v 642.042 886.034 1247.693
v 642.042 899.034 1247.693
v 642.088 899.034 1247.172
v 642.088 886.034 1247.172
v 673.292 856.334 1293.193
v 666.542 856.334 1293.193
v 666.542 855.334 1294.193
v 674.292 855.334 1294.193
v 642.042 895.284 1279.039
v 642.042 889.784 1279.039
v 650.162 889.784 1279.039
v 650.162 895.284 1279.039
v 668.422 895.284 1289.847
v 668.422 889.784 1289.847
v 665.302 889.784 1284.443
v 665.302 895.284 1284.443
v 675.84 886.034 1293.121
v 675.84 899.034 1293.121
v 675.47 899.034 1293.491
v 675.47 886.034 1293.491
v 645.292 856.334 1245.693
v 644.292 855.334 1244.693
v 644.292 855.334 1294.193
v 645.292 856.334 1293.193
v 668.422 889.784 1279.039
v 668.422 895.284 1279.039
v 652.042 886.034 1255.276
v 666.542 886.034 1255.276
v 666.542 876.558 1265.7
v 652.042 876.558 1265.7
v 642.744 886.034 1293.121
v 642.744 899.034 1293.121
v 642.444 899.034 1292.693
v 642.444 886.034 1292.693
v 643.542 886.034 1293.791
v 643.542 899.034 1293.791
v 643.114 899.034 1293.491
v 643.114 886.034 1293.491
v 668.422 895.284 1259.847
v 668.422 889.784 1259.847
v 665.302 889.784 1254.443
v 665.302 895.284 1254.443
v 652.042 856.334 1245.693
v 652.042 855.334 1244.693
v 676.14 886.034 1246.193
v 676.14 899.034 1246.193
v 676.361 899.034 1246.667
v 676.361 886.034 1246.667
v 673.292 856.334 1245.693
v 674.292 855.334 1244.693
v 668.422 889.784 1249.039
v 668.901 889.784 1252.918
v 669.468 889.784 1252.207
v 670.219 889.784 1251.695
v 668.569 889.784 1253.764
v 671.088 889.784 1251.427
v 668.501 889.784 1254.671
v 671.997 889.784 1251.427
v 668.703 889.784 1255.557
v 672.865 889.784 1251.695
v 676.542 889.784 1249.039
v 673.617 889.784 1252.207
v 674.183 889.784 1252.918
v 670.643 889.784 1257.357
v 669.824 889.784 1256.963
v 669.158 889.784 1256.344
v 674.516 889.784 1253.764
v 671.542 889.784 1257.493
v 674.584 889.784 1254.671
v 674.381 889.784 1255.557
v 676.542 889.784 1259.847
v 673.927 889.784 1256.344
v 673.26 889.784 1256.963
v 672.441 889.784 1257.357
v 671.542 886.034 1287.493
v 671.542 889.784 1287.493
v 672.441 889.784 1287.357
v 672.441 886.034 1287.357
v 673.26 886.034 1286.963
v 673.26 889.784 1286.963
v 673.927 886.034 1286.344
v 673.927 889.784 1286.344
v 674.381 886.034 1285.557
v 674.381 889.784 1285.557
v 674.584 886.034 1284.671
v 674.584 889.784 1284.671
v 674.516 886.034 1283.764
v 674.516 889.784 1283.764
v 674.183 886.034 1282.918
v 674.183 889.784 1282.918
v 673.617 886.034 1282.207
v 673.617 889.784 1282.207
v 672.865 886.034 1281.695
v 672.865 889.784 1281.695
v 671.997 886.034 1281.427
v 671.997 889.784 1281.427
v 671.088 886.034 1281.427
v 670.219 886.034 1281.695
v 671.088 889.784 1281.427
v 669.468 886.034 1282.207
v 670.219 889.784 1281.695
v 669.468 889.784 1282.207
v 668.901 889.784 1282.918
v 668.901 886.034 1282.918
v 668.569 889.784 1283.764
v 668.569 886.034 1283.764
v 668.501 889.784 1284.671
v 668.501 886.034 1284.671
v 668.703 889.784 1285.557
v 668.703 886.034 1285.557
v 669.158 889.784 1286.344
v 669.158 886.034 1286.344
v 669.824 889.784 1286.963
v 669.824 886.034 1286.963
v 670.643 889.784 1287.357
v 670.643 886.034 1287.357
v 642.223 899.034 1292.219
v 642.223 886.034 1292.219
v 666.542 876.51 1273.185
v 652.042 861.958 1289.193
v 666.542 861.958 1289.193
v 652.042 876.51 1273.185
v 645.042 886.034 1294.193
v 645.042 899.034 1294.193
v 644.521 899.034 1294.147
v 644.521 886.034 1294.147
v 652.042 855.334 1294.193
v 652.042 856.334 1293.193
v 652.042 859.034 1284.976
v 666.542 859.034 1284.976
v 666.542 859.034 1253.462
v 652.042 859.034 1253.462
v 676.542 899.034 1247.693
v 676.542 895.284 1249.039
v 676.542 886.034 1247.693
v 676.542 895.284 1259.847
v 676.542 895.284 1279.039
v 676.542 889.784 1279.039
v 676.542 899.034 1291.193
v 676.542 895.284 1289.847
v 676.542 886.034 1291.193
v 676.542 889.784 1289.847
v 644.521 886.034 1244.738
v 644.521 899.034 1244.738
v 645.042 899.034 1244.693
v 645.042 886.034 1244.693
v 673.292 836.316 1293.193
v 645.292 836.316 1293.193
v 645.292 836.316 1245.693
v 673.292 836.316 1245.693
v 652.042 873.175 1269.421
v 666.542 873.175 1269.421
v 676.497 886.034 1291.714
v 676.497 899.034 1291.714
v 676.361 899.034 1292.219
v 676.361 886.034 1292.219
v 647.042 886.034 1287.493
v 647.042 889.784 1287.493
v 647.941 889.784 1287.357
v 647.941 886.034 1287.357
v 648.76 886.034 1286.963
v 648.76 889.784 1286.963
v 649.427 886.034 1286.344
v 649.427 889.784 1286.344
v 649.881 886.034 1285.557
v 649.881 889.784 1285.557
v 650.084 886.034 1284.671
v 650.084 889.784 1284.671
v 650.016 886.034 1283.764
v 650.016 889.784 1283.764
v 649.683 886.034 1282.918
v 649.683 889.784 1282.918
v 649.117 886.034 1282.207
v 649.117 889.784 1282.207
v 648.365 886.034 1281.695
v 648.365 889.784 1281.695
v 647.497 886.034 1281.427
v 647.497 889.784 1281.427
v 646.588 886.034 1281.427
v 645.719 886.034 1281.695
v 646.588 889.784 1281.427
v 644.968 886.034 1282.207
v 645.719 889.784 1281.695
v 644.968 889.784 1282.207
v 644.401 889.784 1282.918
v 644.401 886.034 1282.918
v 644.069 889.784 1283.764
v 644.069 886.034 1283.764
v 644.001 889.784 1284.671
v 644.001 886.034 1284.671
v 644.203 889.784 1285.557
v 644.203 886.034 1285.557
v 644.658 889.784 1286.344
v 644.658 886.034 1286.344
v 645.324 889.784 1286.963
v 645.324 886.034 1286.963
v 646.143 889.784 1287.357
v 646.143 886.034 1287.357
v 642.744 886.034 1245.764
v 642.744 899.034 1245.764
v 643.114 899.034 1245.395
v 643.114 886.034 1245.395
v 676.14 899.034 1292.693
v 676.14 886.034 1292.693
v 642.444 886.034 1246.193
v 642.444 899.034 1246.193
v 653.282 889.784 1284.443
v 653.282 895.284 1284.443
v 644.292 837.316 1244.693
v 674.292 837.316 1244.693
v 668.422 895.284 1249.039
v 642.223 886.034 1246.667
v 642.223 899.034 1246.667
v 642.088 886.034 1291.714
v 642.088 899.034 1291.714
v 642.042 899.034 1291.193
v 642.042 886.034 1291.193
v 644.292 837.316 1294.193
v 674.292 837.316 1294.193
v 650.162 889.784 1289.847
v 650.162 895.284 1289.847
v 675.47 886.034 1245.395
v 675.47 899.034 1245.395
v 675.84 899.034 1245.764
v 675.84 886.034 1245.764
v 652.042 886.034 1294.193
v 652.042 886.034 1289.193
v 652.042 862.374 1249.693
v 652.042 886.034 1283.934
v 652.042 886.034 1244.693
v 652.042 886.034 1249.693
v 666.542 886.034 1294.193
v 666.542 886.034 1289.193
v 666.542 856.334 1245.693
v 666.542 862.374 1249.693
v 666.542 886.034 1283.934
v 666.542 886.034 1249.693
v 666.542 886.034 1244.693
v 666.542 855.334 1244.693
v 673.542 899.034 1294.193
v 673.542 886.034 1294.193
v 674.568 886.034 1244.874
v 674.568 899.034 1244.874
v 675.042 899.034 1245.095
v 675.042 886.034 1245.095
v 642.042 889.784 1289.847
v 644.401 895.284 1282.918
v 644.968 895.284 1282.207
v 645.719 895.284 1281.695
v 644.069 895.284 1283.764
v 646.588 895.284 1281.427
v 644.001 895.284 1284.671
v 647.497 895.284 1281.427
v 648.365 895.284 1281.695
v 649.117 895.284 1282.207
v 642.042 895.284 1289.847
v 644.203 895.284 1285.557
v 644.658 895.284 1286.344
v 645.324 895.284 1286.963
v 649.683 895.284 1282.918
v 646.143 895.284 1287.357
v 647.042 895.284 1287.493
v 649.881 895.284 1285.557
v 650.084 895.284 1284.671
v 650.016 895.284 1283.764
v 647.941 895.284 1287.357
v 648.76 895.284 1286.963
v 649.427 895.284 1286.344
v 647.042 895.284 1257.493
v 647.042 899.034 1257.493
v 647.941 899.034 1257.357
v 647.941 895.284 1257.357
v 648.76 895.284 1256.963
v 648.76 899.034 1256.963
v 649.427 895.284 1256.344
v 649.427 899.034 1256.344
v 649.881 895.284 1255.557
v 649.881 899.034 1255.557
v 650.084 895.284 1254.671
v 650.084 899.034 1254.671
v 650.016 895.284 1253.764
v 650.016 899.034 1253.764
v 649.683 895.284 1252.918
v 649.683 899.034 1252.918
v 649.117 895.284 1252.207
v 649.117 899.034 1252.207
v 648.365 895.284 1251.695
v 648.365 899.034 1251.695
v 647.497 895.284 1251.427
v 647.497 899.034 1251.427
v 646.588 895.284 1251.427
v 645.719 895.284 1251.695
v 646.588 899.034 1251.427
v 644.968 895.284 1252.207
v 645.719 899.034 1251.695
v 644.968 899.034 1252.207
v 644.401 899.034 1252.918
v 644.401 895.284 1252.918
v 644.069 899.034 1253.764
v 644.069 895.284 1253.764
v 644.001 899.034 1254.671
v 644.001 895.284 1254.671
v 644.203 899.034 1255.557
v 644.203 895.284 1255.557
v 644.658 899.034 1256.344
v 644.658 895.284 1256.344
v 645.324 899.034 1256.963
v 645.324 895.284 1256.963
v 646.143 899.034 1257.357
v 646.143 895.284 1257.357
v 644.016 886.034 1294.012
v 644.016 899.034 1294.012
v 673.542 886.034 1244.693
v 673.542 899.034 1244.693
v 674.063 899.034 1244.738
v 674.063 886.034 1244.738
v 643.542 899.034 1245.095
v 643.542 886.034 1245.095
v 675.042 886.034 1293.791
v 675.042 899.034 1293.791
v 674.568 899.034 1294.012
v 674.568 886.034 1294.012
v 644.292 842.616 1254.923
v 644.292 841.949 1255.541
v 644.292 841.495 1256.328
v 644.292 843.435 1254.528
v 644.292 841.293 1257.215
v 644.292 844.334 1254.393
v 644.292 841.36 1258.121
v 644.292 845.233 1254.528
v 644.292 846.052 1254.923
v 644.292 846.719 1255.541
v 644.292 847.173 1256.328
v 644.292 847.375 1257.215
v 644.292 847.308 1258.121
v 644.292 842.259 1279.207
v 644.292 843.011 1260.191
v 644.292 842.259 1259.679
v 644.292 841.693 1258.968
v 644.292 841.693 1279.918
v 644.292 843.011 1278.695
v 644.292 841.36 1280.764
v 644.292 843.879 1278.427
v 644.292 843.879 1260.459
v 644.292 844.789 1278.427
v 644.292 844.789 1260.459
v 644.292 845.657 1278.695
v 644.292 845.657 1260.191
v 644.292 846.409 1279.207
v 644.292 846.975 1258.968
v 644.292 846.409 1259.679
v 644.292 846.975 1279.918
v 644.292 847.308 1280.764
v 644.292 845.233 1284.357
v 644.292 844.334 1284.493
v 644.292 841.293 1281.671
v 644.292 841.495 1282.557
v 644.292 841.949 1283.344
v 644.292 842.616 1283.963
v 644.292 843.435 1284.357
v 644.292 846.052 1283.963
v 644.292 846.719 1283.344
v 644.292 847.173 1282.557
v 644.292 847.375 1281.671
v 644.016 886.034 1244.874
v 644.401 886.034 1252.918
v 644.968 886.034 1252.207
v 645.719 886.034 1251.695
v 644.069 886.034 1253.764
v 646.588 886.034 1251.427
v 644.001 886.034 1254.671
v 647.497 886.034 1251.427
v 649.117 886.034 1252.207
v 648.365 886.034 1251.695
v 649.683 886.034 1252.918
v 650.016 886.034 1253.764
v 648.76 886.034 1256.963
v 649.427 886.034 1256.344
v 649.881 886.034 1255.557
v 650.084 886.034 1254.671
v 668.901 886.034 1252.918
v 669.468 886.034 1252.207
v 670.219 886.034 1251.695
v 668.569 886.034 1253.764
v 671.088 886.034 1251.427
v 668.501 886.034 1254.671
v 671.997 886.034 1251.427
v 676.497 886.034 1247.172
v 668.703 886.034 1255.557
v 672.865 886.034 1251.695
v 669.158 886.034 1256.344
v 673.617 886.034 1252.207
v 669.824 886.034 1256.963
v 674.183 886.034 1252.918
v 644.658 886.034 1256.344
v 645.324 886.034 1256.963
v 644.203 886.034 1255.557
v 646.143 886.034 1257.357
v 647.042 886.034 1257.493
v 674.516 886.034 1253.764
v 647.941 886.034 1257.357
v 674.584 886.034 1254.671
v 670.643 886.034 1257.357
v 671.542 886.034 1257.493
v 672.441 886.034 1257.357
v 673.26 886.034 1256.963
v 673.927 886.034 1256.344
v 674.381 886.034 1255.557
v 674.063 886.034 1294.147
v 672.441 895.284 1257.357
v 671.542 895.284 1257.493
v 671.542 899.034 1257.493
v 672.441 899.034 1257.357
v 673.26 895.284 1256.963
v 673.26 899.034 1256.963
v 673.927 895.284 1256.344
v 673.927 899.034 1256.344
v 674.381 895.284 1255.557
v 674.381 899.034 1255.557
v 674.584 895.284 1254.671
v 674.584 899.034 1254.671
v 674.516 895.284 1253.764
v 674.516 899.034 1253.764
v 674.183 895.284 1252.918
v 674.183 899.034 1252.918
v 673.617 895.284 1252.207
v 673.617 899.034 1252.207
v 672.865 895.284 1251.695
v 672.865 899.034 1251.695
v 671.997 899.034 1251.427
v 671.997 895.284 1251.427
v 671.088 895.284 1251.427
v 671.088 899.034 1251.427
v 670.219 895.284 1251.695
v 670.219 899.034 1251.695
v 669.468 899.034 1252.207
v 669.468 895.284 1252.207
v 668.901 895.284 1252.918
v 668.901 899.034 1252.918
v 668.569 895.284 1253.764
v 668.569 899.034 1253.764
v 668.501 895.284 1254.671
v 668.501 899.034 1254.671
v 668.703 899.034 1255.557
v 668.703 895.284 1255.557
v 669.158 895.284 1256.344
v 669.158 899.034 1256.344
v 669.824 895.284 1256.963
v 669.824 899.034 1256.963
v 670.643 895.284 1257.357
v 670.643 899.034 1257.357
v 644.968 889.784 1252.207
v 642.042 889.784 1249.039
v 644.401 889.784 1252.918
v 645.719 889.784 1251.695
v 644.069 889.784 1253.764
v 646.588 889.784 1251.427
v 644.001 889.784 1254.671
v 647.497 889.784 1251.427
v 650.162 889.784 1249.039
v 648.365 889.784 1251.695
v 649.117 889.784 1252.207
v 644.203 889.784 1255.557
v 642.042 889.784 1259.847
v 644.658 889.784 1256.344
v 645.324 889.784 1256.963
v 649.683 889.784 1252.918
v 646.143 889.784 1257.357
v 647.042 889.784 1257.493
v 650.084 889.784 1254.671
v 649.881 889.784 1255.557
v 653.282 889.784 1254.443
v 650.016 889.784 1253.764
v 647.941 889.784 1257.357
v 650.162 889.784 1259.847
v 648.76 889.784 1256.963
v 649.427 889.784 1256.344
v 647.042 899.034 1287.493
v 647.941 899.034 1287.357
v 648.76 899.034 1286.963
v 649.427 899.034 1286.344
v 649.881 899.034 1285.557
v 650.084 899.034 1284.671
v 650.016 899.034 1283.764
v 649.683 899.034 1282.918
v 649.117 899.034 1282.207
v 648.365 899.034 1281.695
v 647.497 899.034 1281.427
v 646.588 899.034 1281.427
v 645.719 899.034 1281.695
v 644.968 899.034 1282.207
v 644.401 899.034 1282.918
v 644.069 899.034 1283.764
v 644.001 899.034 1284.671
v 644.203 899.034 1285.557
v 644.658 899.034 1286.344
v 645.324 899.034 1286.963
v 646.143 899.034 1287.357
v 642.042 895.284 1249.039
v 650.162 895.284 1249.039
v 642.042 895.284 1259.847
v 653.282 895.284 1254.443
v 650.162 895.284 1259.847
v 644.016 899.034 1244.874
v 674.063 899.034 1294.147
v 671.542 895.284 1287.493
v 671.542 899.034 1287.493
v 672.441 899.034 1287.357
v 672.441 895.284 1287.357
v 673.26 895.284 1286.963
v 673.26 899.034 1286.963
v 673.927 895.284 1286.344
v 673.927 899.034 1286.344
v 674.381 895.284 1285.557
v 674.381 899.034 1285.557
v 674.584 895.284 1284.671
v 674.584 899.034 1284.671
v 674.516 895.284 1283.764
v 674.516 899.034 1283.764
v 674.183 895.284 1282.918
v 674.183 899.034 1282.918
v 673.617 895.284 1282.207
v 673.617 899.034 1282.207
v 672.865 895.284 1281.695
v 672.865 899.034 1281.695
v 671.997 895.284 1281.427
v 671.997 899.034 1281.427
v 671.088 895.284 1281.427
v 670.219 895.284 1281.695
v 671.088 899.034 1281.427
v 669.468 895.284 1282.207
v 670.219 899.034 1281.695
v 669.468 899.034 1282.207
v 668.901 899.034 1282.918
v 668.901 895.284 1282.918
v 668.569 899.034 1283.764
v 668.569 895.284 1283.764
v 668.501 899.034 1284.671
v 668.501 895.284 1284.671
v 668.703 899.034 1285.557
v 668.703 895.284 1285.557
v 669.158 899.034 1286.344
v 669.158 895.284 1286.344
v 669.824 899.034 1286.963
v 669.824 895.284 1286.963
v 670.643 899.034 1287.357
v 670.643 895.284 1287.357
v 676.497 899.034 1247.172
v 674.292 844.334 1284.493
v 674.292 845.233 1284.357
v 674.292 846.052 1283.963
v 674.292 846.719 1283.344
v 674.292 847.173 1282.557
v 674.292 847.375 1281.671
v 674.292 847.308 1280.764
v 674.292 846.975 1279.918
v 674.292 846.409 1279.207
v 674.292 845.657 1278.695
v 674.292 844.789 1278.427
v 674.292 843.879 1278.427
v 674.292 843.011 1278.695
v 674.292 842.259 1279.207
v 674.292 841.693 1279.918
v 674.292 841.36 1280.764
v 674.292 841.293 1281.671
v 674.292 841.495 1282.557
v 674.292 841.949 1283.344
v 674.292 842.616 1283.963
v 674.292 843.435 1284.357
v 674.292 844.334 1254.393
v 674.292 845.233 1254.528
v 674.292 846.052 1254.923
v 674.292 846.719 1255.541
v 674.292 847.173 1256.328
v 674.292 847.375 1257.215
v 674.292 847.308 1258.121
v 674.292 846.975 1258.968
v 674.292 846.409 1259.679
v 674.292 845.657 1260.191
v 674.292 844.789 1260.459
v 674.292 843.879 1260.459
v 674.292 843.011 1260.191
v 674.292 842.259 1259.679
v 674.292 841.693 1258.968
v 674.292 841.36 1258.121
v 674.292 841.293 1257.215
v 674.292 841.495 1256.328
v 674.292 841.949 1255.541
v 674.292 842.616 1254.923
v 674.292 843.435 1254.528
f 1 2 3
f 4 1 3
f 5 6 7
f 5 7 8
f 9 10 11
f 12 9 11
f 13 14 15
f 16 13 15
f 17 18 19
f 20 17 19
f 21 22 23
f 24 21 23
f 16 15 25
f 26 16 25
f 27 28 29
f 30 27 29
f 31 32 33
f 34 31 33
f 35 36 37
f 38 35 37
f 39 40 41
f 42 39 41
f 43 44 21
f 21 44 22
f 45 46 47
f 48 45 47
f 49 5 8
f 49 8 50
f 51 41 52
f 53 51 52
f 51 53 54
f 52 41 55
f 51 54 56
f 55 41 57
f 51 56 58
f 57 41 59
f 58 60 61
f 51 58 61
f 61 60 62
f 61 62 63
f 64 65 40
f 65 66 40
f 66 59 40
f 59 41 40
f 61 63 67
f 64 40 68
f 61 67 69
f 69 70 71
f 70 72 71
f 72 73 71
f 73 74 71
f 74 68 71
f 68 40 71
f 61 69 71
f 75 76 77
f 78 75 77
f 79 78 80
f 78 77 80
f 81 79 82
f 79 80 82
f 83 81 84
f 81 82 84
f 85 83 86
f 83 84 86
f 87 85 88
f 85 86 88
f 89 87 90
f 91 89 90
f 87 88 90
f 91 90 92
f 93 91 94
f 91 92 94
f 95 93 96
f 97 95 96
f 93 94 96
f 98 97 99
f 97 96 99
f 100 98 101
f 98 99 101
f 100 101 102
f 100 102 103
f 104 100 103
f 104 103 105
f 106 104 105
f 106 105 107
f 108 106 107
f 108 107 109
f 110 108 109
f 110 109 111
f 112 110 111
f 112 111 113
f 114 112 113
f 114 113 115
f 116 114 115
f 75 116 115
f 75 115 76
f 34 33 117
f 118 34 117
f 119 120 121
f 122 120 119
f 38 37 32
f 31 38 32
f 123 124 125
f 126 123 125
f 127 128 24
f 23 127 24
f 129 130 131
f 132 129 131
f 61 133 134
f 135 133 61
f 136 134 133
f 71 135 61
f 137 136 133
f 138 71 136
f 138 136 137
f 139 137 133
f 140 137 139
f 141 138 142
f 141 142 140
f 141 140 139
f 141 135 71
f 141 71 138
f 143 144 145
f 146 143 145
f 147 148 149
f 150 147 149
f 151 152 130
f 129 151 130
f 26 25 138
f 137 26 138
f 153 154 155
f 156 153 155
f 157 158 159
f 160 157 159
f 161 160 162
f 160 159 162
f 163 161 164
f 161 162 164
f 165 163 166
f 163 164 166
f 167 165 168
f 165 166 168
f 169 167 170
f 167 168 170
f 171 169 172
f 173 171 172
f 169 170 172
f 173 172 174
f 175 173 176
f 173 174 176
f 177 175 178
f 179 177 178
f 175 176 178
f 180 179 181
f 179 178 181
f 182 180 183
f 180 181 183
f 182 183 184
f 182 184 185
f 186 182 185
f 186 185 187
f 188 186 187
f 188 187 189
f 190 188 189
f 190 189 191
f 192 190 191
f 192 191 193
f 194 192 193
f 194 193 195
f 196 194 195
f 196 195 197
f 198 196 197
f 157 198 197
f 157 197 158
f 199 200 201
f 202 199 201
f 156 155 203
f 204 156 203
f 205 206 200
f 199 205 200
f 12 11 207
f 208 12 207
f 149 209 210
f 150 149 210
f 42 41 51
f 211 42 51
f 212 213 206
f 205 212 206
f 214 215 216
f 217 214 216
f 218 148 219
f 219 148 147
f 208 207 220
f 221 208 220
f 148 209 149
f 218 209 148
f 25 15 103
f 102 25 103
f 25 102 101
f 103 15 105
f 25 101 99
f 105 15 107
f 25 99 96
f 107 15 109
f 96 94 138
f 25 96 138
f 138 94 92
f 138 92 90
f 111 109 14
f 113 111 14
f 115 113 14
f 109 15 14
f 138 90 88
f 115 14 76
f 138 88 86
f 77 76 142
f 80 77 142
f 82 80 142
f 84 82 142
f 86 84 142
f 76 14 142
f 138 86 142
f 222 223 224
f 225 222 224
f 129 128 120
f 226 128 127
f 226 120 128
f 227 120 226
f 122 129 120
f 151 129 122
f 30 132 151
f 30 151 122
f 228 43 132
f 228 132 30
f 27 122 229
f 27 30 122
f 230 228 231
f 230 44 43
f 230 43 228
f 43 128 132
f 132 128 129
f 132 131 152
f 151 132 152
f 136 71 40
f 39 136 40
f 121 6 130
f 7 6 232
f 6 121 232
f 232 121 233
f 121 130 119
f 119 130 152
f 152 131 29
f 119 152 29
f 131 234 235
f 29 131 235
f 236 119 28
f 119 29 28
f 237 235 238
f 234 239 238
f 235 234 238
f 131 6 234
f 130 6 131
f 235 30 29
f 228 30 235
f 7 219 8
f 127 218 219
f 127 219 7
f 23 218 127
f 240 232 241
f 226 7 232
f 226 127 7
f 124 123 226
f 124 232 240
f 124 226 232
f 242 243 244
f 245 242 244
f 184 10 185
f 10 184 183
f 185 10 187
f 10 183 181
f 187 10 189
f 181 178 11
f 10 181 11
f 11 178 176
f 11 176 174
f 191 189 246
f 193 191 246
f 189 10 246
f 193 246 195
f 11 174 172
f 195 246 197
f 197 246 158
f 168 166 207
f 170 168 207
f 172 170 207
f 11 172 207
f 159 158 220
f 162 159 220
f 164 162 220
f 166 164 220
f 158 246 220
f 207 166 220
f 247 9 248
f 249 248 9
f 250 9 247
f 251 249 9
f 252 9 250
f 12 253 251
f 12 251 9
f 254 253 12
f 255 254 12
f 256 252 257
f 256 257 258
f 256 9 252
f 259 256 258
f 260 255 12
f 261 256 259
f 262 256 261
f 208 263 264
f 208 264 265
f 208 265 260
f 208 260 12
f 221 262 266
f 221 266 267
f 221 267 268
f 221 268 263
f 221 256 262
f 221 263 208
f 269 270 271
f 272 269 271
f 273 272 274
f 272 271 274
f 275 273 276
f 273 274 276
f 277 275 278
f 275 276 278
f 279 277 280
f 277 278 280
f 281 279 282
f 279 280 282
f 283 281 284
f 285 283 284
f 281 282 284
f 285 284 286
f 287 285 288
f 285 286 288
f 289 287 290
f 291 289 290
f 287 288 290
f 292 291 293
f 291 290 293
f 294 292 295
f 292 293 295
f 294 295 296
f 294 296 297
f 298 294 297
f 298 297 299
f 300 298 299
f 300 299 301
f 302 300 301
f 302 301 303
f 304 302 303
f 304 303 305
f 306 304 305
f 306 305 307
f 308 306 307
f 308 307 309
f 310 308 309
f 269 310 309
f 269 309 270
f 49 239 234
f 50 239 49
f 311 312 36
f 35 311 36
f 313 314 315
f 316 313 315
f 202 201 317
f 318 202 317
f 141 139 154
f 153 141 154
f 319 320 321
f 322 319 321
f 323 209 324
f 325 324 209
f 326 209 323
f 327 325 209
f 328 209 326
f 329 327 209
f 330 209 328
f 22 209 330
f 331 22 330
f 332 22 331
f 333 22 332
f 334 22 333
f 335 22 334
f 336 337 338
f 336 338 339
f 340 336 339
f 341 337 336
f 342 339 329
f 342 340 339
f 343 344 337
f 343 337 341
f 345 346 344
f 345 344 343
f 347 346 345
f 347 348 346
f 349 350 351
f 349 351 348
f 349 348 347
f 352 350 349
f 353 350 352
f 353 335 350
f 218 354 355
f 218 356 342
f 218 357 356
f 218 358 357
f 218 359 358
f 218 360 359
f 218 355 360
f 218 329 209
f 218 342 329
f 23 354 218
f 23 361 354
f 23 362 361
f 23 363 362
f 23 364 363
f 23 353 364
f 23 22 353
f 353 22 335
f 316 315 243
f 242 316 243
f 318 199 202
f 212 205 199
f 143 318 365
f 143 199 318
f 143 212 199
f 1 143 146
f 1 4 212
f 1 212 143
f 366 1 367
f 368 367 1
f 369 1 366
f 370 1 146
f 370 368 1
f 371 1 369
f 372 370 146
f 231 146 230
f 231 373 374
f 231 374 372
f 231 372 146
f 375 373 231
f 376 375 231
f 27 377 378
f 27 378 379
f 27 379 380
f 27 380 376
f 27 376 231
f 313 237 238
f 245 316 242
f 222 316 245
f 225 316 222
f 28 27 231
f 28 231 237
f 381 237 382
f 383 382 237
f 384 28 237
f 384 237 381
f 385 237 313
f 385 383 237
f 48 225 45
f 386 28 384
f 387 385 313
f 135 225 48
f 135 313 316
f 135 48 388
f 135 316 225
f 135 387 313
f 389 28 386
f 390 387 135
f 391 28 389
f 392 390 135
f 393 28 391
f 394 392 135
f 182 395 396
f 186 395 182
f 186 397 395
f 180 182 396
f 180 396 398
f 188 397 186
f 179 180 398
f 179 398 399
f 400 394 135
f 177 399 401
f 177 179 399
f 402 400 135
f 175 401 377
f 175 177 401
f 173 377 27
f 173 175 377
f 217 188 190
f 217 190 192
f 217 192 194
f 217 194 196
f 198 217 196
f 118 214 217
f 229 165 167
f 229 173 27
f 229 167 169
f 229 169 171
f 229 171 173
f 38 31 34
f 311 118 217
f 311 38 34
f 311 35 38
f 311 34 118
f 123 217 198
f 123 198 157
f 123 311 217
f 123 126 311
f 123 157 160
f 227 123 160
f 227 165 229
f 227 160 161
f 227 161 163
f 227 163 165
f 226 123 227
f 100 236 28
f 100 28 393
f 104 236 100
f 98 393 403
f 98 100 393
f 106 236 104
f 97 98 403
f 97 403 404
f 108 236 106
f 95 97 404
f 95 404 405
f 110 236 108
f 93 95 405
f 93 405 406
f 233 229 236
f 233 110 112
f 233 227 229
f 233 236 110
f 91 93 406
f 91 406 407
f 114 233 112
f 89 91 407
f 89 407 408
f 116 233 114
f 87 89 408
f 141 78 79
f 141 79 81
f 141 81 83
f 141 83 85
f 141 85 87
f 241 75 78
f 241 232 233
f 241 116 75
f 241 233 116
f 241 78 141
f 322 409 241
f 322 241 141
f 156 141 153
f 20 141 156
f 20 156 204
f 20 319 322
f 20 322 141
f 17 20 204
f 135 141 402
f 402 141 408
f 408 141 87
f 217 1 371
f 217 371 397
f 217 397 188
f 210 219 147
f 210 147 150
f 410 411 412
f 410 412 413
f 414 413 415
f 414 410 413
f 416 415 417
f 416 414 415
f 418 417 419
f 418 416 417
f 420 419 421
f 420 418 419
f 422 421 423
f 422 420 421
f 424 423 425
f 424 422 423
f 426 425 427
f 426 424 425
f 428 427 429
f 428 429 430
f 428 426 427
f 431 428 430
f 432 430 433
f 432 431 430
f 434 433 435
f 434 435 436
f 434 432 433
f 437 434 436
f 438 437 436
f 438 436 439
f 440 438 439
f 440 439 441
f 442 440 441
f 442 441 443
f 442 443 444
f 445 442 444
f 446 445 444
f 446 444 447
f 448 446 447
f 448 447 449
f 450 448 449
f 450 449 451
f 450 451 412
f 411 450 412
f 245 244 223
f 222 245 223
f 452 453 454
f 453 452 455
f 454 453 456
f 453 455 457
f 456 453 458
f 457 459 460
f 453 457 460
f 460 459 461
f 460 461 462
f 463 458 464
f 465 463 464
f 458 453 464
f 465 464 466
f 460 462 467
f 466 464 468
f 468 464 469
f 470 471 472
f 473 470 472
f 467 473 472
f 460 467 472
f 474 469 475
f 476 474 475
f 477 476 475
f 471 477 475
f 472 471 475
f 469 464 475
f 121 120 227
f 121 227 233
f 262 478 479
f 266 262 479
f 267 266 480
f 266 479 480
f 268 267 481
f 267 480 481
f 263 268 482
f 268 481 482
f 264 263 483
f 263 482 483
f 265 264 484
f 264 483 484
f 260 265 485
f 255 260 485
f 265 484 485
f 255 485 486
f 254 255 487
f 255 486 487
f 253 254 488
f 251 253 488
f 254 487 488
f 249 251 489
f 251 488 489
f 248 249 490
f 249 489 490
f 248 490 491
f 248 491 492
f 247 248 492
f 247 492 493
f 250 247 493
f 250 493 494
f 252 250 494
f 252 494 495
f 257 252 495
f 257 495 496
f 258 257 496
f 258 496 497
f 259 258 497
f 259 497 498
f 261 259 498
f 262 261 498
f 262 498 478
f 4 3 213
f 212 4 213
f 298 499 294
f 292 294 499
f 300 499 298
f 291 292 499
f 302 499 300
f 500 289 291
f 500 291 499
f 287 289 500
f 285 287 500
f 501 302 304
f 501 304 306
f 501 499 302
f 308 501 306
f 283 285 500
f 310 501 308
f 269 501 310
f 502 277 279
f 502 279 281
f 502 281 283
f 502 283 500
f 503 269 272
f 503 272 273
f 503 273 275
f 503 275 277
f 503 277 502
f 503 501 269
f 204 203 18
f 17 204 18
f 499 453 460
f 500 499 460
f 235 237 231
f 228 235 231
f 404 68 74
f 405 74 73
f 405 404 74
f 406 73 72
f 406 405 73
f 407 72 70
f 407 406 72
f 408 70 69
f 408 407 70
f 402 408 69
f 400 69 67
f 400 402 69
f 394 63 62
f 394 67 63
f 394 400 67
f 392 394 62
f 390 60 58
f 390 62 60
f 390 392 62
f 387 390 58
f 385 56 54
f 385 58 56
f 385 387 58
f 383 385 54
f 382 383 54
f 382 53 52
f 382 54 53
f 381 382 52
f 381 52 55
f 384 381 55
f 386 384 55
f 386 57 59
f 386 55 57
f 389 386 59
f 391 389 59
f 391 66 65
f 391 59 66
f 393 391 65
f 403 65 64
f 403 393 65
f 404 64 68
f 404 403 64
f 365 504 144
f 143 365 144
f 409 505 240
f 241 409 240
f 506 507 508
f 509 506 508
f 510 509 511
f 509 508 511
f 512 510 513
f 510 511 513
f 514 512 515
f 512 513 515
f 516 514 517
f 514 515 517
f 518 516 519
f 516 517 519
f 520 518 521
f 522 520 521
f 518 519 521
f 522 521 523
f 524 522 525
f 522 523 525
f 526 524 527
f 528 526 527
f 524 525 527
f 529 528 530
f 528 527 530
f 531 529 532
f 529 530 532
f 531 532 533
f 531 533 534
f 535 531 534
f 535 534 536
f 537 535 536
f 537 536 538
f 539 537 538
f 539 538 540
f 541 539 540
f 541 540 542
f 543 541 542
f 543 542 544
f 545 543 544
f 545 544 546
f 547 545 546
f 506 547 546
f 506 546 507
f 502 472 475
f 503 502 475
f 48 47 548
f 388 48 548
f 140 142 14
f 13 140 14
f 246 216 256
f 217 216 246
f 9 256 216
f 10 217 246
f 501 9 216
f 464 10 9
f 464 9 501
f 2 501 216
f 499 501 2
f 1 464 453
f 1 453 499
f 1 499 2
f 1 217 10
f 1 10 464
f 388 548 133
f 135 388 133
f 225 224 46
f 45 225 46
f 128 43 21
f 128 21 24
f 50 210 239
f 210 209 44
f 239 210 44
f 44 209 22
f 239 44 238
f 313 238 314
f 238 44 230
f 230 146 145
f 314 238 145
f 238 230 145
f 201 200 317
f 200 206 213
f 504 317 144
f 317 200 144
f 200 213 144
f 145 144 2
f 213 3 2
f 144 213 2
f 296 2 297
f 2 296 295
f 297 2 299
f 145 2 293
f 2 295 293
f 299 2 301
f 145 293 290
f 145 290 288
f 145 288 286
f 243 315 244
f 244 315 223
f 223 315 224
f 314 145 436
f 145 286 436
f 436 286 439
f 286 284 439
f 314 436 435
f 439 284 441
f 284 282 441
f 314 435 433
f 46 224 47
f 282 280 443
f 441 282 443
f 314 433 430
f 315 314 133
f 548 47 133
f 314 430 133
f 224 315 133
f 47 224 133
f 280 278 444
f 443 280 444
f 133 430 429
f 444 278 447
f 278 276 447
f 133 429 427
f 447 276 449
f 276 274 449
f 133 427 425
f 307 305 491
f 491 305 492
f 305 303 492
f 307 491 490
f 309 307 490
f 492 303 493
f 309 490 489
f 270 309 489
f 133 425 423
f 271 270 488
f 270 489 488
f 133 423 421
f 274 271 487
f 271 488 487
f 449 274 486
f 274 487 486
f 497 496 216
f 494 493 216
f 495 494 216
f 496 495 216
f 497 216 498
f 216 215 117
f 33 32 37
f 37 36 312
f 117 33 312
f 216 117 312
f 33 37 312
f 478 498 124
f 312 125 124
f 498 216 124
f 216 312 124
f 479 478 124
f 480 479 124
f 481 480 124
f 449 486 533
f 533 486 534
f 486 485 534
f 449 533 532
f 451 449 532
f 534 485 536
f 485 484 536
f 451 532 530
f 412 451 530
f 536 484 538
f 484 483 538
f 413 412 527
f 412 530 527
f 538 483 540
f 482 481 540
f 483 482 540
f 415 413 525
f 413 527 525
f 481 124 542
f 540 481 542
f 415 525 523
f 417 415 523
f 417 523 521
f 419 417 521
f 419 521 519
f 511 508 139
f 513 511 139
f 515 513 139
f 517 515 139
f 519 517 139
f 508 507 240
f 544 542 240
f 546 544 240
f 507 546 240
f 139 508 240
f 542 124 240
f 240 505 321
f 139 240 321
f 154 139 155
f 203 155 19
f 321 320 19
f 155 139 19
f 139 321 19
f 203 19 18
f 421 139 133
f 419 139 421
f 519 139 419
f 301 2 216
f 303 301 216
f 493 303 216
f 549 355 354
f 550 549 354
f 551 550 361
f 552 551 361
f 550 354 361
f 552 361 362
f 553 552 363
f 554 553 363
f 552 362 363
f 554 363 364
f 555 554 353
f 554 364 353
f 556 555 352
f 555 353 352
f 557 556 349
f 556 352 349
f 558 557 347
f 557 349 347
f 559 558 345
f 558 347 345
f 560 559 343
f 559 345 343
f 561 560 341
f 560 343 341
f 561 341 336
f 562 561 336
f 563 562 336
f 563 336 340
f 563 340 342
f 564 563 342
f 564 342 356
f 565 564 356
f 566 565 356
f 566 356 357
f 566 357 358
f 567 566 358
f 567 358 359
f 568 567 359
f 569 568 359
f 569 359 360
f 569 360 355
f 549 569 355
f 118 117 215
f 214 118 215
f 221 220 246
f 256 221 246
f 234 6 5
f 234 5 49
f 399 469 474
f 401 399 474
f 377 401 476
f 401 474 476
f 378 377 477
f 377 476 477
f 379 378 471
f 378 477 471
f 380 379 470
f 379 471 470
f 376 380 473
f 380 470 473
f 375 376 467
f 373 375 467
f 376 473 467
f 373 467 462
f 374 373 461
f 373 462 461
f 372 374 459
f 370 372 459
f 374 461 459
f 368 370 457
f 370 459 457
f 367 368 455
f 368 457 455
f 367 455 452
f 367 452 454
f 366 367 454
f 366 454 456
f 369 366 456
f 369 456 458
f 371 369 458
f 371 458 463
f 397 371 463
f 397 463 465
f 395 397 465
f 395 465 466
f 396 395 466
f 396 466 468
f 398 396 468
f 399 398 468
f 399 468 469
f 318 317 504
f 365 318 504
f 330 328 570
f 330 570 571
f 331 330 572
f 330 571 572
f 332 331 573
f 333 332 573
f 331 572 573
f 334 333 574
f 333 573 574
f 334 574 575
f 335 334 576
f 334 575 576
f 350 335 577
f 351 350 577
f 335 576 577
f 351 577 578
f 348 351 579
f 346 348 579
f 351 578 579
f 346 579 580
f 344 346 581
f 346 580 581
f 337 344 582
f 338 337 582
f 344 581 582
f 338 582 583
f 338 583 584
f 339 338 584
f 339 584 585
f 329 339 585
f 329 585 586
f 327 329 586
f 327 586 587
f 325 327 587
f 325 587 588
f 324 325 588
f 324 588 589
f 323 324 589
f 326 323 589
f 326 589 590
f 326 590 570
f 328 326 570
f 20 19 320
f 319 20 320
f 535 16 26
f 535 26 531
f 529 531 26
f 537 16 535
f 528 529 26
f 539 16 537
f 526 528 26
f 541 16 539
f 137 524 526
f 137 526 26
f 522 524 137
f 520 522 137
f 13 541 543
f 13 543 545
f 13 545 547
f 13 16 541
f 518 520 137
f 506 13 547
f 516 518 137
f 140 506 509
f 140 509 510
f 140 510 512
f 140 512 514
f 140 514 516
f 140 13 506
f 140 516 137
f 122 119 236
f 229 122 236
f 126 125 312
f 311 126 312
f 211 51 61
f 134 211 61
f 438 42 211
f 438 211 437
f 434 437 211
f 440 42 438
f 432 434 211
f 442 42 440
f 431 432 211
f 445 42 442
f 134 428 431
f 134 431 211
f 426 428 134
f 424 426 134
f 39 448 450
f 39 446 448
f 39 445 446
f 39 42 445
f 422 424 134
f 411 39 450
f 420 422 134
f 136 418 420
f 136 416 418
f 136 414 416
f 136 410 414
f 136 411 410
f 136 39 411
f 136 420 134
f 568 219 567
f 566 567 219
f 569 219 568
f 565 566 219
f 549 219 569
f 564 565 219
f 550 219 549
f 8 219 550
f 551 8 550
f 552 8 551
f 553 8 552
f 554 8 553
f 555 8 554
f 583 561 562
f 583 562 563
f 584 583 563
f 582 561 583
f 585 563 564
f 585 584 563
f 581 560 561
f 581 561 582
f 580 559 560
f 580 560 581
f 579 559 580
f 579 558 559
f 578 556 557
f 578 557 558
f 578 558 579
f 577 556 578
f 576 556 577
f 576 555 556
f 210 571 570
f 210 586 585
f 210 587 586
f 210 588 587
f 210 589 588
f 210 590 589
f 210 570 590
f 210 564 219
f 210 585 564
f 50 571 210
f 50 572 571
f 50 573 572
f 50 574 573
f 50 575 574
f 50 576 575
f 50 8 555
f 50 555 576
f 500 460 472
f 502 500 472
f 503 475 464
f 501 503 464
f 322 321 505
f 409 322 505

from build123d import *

# Parameters (mm, degrees)
BOSS_EXTRUDE1_DEPTH = 14.49996233
SKETCH2_W           = 14.49996233
SKETCH2_H           = 39.499998092
BOSS_EXTRUDE2_DEPTH = 25.642454624
SKETCH3_W           = 14.49996233
SKETCH3_H           = 49.71832037
BOSS_EXTRUDE3_DEPTH = 4.999995232
SKETCH4_W           = 14.49996233
SKETCH4_H           = 49.71832037
BOSS_EXTRUDE4_DEPTH = 4.999995232
BOSS_EXTRUDE5_DEPTH = 13.000011444
SKETCH6_W           = 49.499988556
SKETCH6_H           = 20.018339158
BOSS_EXTRUDE6_DEPTH = 7.750034332
SKETCH7_W           = 49.499988556
SKETCH7_H           = 20.018339158
BOSS_EXTRUDE7_DEPTH = 7.750034332
CUT_EXTRUDE1_DEPTH  = 5.499958992
CUT_EXTRUDE2_START  = -13.000012
SKETCH9_R           = 3.049969673
CUT_EXTRUDE2_DEPTH  = 13.000012
CUT_EXTRUDE3_DEPTH  = 5.499958992
CUT_EXTRUDE4_REACH  = 1463.704
SKETCH11_R          = 3.049969673
CUT_EXTRUDE5_DEPTH  = 5.499958992
CUT_EXTRUDE6_REACH  = 1463.704
SKETCH13_R          = 3.049969673
CUT_EXTRUDE7_DEPTH  = 5.499958992
CUT_EXTRUDE8_REACH  = 1463.704
SKETCH15_R          = 3.049969673
SKETCH16_R          = 3.049999475
CUT_EXTRUDE9_DEPTH  = 1577.146186494
SKETCH17_R          = 3.049999475
CUT_EXTRUDE10_DEPTH = 1577.146187713
CUT_EXTRUDE15_DEPTH = 1577.006659293
CHAMFER1_SIZE2      = 0.999987125
CHAMFER1_SIZE       = 1.00004673
CHAMFER2_SIZE       = 1.00004673


with BuildPart() as part:
    # Sketch1 → Boss-Extrude1 (new body)
    with BuildSketch(Plane(origin=(652.042150497, 0, 0), x_dir=(0, -1, 0), z_dir=(-1, 0, 0))):
        Polygon((-861.958086491, 1249.692678452), (-861.958086491, 1289.192676544), (-876.510083675, 1273.185491562), (-886.033952236, 1283.933758736), (-886.033952236, 1255.276203156), (-876.557826996, 1265.699982643), (-862.374186516, 1249.692678452), align=None)
    extrude(amount=-BOSS_EXTRUDE1_DEPTH)

    # Sketch2 → Boss-Extrude2 (add)
    with BuildSketch(Plane.XZ.offset(-861.958086491)):
        with Locations((659.292131662, 1269.442677498)):
            Rectangle(SKETCH2_W, SKETCH2_H)
    extrude(amount=BOSS_EXTRUDE2_DEPTH)

    # Sketch3 → Boss-Extrude3 (add)
    with BuildSketch(Plane(origin=(0, 0, 1249.692678452), x_dir=(-1, 0, 0), z_dir=(0, 0, -1))):
        with Locations((-659.292131662, 861.174792051)):
            Rectangle(SKETCH3_W, SKETCH3_H)
    extrude(amount=BOSS_EXTRUDE3_DEPTH)

    # Sketch4 → Boss-Extrude4 (add)
    with BuildSketch(Plane.XY.offset(1289.192676544)):
        with Locations((659.292131662, 861.174792051)):
            Rectangle(SKETCH4_W, SKETCH4_H)
    extrude(amount=BOSS_EXTRUDE4_DEPTH)

    # Sketch5 → Boss-Extrude5 (add)
    with BuildSketch(Plane(origin=(0, 886.033952236, 0), x_dir=(-1, 0, 0), z_dir=(0, 1, 0))):
        Polygon((-642.744004726, 1245.764374733), (-643.113732338, 1245.394587517), (-643.54211092, 1245.094656944), (-644.016087055, 1244.873642921), (-644.521176815, 1244.738340378), (-645.04212141, 1244.69268322), (-673.542141914, 1244.69268322), (-674.06308651, 1244.738340378), (-674.56817627, 1244.873642921), (-675.042152405, 1245.094656944), (-675.470471382, 1245.394587517), (-675.840258598, 1245.764374733), (-676.140189171, 1246.19269371), (-676.361203194, 1246.666669846), (-676.496565342, 1247.171759605), (-676.542103291, 1247.692704201), (-676.542103291, 1291.192650795), (-676.496565342, 1291.71359539), (-676.361203194, 1292.21868515), (-676.140189171, 1292.692661285), (-675.840258598, 1293.121099472), (-675.470471382, 1293.490767479), (-675.042152405, 1293.790817261), (-674.56817627, 1294.011712074), (-674.06308651, 1294.147133827), (-673.542141914, 1294.192671776), (-645.04212141, 1294.192671776), (-644.521176815, 1294.147133827), (-644.016087055, 1294.011712074), (-643.54211092, 1293.790817261), (-643.113732338, 1293.490767479), (-642.744004726, 1293.121099472), (-642.444074154, 1292.692661285), (-642.223060131, 1292.21868515), (-642.087697983, 1291.71359539), (-642.04210043, 1291.192650795), (-642.04210043, 1247.692704201), (-642.087697983, 1247.171759605), (-642.223060131, 1246.666669846), (-642.444074154, 1246.19269371), align=None)
    extrude(amount=BOSS_EXTRUDE5_DEPTH)

    # Sketch6 → Boss-Extrude6 (add)
    with BuildSketch(Plane.ZY.offset(-652.042150497)):
        with Locations((1269.442677498, 846.324801445)):
            Rectangle(SKETCH6_W, SKETCH6_H)
    extrude(amount=BOSS_EXTRUDE6_DEPTH)

    # Sketch7 → Boss-Extrude7 (add)
    with BuildSketch(Plane(origin=(666.542112827, 0, 0), x_dir=(0, 0, -1), z_dir=(1, 0, 0))):
        with Locations((-1269.442677498, 846.324801445)):
            Rectangle(SKETCH7_W, SKETCH7_H)
    extrude(amount=BOSS_EXTRUDE7_DEPTH)

    # Sketch8 → Cut-Extrude1 (cut)
    with BuildSketch(Plane.XZ.offset(-889.783978462)):
        Polygon((676.542103291, 1259.846687317), (668.422102928, 1259.846687317), (665.302097797, 1254.442691803), (668.422102928, 1249.038696289), (676.542103291, 1249.038696289), align=None)
    extrude(amount=-CUT_EXTRUDE1_DEPTH, mode=Mode.SUBTRACT)

    # Sketch9 → Cut-Extrude2 (cut)
    with BuildSketch(Plane(origin=(0, 899.03396368, 0), x_dir=(-1, 0, 0), z_dir=(0, 1, 0)).offset(CUT_EXTRUDE2_START)):
        with Locations(Location((-671.542108059, 1254.442691803, 0), (0, 0, 90))):
            Circle(SKETCH9_R)
    extrude(amount=CUT_EXTRUDE2_DEPTH, mode=Mode.SUBTRACT)

    # Sketch10 → Cut-Extrude3 (cut)
    with BuildSketch(Plane.XZ.offset(-889.783978462)):
        Polygon((642.04210043, 1249.038696289), (650.162100792, 1249.038696289), (653.282105923, 1254.442691803), (650.162100792, 1259.846687317), (642.04210043, 1259.846687317), align=None)
    extrude(amount=-CUT_EXTRUDE3_DEPTH, mode=Mode.SUBTRACT)

    # Cut-Extrude4: up to this face of the body (flat: up to its plane)
    cut_extrude4_end = Plane(part.part.faces().sort_by_distance((643.088277536, 886.033952236, 1246.324624689))[0])
    # Sketch11 → Cut-Extrude4 (cut, up to the picked face)
    with BuildSketch(Plane(origin=(0, 899.03396368, 0), x_dir=(-1, 0, 0), z_dir=(0, 1, 0)), mode=Mode.PRIVATE) as cut_extrude4_sk1:
        with Locations(Location((-647.042095661, 1254.442691803, 0), (0, 0, 90))):
            Circle(SKETCH11_R)
    cut_extrude4_tool1 = split(extrude(cut_extrude4_sk1.sketch, amount=-CUT_EXTRUDE4_REACH, mode=Mode.PRIVATE), bisect_by=cut_extrude4_end, keep=Keep.BOTH, mode=Mode.PRIVATE)
    add(cut_extrude4_tool1.solids().sort_by(Axis((647.042096, 899.033964, 1254.442692), (0, -1, 0)))[0], mode=Mode.SUBTRACT)

    # Sketch12 → Cut-Extrude5 (cut)
    with BuildSketch(Plane.XZ.offset(-889.783978462)):
        Polygon((642.04210043, 1279.038667679), (650.162100792, 1279.038667679), (653.282105923, 1284.442663193), (650.162100792, 1289.846658707), (642.04210043, 1289.846658707), align=None)
    extrude(amount=-CUT_EXTRUDE5_DEPTH, mode=Mode.SUBTRACT)

    # Cut-Extrude6: up to this face of the body (flat: up to its plane)
    cut_extrude6_end = Plane(part.part.faces().sort_by_distance((643.088277536, 886.033952236, 1246.324624689))[0])
    # Sketch13 → Cut-Extrude6 (cut, up to the picked face)
    with BuildSketch(Plane(origin=(0, 899.03396368, 0), x_dir=(-1, 0, 0), z_dir=(0, 1, 0)), mode=Mode.PRIVATE) as cut_extrude6_sk1:
        with Locations(Location((-647.042095661, 1284.442663193, 0), (0, 0, 90))):
            Circle(SKETCH13_R)
    cut_extrude6_tool1 = split(extrude(cut_extrude6_sk1.sketch, amount=-CUT_EXTRUDE6_REACH, mode=Mode.PRIVATE), bisect_by=cut_extrude6_end, keep=Keep.BOTH, mode=Mode.PRIVATE)
    add(cut_extrude6_tool1.solids().sort_by(Axis((647.042096, 899.033964, 1284.442663), (0, -1, 0)))[0], mode=Mode.SUBTRACT)

    # Sketch14 → Cut-Extrude7 (cut)
    with BuildSketch(Plane.XZ.offset(-889.783978462)):
        Polygon((676.542103291, 1289.846658707), (668.422102928, 1289.846658707), (665.302097797, 1284.442663193), (668.422102928, 1279.038667679), (676.542103291, 1279.038667679), align=None)
    extrude(amount=-CUT_EXTRUDE7_DEPTH, mode=Mode.SUBTRACT)

    # Cut-Extrude8: up to this face of the body (flat: up to its plane)
    cut_extrude8_end = Plane(part.part.faces().sort_by_distance((643.088277536, 886.033952236, 1246.324624689))[0])
    # Sketch15 → Cut-Extrude8 (cut, up to the picked face)
    with BuildSketch(Plane(origin=(0, 899.03396368, 0), x_dir=(-1, 0, 0), z_dir=(0, 1, 0)), mode=Mode.PRIVATE) as cut_extrude8_sk1:
        with Locations(Location((-671.542108059, 1284.442663193, 0), (0, 0, 90))):
            Circle(SKETCH15_R)
    cut_extrude8_tool1 = split(extrude(cut_extrude8_sk1.sketch, amount=-CUT_EXTRUDE8_REACH, mode=Mode.PRIVATE), bisect_by=cut_extrude8_end, keep=Keep.BOTH, mode=Mode.PRIVATE)
    add(cut_extrude8_tool1.solids().sort_by(Axis((671.542108, 899.033964, 1284.442663), (0, -1, 0)))[0], mode=Mode.SUBTRACT)

    # Sketch16 → Cut-Extrude9 (cut, through all)
    with BuildSketch(Plane.ZY.offset(-644.292116165)):
        with Locations((1281.442642212, 844.333976507)):
            Circle(SKETCH16_R)
    extrude(amount=-CUT_EXTRUDE9_DEPTH, mode=Mode.SUBTRACT)

    # Sketch17 → Cut-Extrude10 (cut, through all)
    with BuildSketch(Plane(origin=(674.29214716, 0, 0), x_dir=(0, 0, -1), z_dir=(1, 0, 0))):
        with Locations((-1257.442712784, 844.333976507)):
            Circle(SKETCH17_R)
    extrude(amount=-CUT_EXTRUDE10_DEPTH, mode=Mode.SUBTRACT)

    # Sketch22 → Cut-Extrude15 (cut, through all)
    with BuildSketch(Plane(origin=(666.542112827, 0, 0), x_dir=(0, 0, -1), z_dir=(1, 0, 0))):
        Polygon((-1253.462314606, 859.033942223), (-1269.421219826, 873.174786568), (-1284.976124763, 859.033942223), align=None)
    extrude(amount=-CUT_EXTRUDE15_DEPTH, mode=Mode.SUBTRACT)

    # Chamfer1
    chamfer1_edges = [part.edges().sort_by_distance(p)[0] for p in [
        (648.167133331, 856.333971024, 1294.192671776),
        (648.167133331, 856.333971024, 1244.69268322),
        (644.292116165, 856.333971024, 1269.442677498),
        (670.417129993, 856.333971024, 1244.69268322),
        (670.417129993, 856.333971024, 1294.192671776),
        (674.29214716, 856.333971024, 1269.442677498),
    ]]
    chamfer(chamfer1_edges, length=CHAMFER1_SIZE, length2=CHAMFER1_SIZE2)

    # Chamfer2
    chamfer2_edges = [part.edges().sort_by_distance(p)[0] for p in [
        (644.292116165, 836.315631866, 1269.442677498),
        (674.29214716, 836.315631866, 1269.442677498),
        (659.292131662, 836.315631866, 1244.69268322),
        (659.292131662, 836.315631866, 1294.192671776),
    ]]
    chamfer(chamfer2_edges, length=CHAMFER2_SIZE)


solid = part.part
